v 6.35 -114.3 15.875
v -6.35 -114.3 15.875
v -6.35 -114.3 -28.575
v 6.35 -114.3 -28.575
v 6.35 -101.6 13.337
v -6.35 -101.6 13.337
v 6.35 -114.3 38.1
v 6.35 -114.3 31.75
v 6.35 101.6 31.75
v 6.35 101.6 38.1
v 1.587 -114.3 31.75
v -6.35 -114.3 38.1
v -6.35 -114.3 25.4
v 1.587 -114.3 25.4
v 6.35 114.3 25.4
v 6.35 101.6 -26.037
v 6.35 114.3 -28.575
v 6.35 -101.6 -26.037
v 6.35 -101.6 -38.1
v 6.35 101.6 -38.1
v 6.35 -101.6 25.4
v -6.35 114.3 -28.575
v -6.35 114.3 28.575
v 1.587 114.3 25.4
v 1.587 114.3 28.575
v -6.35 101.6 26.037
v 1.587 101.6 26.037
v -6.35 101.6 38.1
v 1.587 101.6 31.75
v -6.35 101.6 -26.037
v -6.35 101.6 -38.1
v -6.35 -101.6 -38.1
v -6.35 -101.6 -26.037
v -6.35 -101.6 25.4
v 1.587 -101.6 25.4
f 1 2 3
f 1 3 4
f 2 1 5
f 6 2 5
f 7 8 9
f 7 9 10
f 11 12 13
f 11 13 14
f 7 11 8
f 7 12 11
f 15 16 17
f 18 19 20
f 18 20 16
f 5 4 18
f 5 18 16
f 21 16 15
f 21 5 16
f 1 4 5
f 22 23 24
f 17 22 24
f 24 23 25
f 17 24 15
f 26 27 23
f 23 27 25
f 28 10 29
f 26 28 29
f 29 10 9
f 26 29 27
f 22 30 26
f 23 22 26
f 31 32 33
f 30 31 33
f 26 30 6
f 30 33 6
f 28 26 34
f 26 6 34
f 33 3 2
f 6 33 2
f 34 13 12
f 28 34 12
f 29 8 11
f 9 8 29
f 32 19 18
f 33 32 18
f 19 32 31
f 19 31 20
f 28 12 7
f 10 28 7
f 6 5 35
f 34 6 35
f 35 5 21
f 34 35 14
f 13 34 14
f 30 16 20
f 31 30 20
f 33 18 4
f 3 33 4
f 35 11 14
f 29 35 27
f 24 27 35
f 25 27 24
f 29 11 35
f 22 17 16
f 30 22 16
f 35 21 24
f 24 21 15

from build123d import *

# Parameters (mm, degrees)
F0_W     = 12.7
F0_H     = 76.2
F1_DEPTH = 114.3
F3_DEPTH = 12.7
F4_W     = 228.6
F4_H     = 6.35
F5_DEPTH = 4.7625


with BuildPart() as f1:
    # F0 (on Front) → F1 (new body, symmetric)
    with BuildSketch(Plane.XZ):
        Rectangle(F0_W, F0_H)
    extrude(amount=F1_DEPTH, both=True)

    # F2 (on face) → F3 (cut, through all)
    with BuildSketch(Plane.YZ.offset(6.35)):
        Polygon((-101.6, 25.4), (-114.3, 25.4), (-114.3, 15.875), (-101.6, 13.33729), align=None)
        Polygon((-114.3, -28.575), (-114.3, -38.1), (-101.6, -38.1), (-101.6, -26.03729), align=None)
        Polygon((114.3, 28.575), (114.3, 38.1), (101.6, 38.1), (101.6, 26.03729), align=None)
        Polygon((101.6, -38.1), (114.3, -38.1), (114.3, -28.575), (101.6, -26.03729), align=None)
    extrude(amount=-F3_DEPTH, mode=Mode.SUBTRACT)

    # F4 (on face) → F5 (cut)
    with BuildSketch(Plane.YZ.offset(6.35)):
        with Locations((0, 28.575)):
            Rectangle(F4_W, F4_H)
    extrude(amount=-F5_DEPTH, mode=Mode.SUBTRACT)


solid = f1.part
